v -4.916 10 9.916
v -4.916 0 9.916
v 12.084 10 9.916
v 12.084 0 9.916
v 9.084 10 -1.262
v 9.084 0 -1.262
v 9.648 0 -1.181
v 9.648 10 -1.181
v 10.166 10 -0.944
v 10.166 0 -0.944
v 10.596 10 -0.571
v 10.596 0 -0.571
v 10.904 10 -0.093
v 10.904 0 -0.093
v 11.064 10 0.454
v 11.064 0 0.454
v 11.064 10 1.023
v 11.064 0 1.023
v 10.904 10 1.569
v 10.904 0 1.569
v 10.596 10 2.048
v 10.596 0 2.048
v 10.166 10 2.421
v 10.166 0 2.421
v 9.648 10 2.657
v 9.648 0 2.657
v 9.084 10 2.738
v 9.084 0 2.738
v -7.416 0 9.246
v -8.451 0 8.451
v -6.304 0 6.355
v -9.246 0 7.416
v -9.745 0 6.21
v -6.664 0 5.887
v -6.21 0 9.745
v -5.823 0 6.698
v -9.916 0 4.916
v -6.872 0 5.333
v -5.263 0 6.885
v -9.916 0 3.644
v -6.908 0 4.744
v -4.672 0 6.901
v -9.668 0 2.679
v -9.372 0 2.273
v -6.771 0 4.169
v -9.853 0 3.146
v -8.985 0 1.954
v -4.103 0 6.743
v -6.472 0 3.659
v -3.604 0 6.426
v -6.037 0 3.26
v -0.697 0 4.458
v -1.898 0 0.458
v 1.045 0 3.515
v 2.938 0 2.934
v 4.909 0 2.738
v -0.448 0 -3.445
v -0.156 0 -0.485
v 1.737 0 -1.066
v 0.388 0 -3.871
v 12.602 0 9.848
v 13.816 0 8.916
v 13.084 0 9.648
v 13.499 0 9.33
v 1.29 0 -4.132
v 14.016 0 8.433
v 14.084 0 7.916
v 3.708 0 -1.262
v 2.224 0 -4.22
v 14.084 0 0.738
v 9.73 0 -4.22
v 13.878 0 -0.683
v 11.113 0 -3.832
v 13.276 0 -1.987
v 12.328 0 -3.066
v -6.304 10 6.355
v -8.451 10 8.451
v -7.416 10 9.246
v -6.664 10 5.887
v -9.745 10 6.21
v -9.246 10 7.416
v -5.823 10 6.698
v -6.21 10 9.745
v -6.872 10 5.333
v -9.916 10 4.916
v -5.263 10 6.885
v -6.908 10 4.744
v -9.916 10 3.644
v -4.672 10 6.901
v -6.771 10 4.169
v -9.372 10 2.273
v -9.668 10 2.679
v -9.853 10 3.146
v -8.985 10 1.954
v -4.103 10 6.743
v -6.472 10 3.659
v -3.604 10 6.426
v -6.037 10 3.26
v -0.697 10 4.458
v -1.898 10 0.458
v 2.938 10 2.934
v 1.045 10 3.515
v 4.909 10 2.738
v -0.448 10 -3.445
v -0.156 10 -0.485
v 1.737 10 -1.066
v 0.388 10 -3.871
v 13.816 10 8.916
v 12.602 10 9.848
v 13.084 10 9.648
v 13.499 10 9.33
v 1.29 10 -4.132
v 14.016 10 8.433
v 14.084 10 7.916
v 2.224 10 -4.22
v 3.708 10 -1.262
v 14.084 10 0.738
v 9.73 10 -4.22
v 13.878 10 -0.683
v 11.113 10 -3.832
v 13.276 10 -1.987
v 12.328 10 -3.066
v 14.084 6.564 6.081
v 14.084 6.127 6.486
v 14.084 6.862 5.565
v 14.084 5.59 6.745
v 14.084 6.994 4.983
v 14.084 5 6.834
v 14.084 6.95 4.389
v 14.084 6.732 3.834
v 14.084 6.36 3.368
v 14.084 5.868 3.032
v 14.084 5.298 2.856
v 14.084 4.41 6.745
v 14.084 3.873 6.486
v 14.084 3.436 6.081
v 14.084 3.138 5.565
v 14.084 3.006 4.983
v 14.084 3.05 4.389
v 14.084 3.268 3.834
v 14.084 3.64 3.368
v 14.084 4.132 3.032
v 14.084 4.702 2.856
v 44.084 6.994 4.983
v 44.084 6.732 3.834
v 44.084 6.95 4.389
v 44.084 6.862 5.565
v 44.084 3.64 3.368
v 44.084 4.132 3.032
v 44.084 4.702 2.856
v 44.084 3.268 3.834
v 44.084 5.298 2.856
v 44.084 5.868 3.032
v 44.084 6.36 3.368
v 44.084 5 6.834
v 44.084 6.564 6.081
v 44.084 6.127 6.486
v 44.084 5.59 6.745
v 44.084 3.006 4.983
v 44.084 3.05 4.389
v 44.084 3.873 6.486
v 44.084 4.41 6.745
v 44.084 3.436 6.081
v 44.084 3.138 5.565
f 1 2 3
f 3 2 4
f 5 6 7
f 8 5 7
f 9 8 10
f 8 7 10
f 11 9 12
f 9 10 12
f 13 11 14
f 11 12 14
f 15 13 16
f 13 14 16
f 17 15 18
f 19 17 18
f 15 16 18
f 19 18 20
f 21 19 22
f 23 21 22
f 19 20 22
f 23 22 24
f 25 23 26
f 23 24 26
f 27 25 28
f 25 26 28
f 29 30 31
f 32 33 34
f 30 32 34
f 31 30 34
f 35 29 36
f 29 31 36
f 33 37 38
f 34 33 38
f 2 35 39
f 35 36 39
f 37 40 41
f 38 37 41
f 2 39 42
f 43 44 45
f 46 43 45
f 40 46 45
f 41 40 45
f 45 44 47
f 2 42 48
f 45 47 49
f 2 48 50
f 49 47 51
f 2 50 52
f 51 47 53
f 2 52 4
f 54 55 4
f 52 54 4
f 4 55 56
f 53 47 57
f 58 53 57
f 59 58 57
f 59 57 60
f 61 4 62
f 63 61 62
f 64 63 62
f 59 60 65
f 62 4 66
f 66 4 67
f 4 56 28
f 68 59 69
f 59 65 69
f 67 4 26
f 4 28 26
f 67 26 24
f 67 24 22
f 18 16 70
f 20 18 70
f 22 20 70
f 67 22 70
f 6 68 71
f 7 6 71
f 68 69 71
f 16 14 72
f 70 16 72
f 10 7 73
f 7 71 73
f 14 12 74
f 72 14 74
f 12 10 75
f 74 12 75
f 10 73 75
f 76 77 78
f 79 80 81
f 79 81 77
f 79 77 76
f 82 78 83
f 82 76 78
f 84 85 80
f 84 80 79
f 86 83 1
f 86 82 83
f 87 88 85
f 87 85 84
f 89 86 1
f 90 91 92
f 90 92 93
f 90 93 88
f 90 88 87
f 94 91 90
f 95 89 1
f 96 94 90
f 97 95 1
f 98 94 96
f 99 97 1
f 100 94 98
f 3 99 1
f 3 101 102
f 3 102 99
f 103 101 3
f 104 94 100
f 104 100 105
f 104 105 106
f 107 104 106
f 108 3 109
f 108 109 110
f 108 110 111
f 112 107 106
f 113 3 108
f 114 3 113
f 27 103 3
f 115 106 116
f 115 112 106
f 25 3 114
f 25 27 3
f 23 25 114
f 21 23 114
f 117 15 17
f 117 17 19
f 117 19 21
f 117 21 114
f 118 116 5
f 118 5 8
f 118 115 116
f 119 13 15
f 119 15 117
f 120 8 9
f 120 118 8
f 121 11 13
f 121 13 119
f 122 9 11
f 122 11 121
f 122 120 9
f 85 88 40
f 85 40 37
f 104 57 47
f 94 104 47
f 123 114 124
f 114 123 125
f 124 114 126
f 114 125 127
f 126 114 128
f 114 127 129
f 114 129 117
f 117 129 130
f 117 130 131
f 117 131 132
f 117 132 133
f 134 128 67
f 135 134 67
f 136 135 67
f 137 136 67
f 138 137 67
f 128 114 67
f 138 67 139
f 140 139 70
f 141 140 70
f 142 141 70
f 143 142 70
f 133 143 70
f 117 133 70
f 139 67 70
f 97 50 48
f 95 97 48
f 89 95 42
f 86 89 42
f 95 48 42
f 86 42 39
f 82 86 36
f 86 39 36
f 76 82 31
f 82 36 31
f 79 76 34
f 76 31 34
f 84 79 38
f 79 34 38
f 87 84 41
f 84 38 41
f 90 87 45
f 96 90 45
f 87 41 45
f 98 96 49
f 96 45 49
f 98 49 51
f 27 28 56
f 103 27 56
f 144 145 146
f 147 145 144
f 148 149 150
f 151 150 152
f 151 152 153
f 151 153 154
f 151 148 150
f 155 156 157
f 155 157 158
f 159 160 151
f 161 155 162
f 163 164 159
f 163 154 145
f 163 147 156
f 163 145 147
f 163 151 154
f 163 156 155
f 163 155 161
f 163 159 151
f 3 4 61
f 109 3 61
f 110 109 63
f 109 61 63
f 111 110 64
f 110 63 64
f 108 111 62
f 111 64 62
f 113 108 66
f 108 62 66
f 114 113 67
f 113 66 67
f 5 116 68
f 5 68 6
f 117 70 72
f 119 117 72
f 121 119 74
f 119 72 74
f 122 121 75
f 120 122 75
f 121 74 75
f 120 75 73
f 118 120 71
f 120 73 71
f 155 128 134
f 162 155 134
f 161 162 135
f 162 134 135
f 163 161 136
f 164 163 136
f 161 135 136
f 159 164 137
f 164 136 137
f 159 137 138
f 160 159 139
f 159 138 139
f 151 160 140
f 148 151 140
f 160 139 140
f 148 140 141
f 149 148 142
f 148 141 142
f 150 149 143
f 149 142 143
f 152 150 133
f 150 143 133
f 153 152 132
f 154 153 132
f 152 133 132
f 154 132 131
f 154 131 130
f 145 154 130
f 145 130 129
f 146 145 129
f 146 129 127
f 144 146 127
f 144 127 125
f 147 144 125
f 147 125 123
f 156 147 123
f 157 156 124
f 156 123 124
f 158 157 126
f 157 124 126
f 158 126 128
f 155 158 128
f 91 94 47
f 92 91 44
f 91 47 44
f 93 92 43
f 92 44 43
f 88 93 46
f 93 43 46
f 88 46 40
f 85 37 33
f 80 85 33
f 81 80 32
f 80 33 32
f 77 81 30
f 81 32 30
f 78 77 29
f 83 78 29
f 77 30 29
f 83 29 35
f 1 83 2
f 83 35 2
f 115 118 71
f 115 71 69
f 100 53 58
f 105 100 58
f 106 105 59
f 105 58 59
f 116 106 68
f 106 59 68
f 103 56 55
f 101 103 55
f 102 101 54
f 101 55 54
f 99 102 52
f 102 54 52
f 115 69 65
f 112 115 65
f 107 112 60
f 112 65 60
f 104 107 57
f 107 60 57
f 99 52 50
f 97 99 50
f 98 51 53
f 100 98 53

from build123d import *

# Parameters (mm, degrees)
BOSS_EXTRUDE1_DEPTH = 10
SKETCH2_R           = 2
BOSS_EXTRUDE2_DEPTH = 30


with BuildPart() as part:
    # Sketch1 → Boss-Extrude1 (new body)
    with BuildSketch(Plane(origin=(0, 0, 0), x_dir=(1, 0, 0), z_dir=(0, 1, 0))):
        with BuildLine():
            Line((-4.915670141, -9.915670141), (12.084329859, -9.915670141))
            ThreePointArc((12.084329859, -9.915670141), (13.498543421, -9.329883704), (14.084329859, -7.915670141))
            Line((14.084329859, -7.915670141), (14.084329859, -0.738316599))
            ThreePointArc((14.084329859, -0.738316599), (12.841308154, 2.560943028), (9.730284223, 4.219782125))
            Line((9.730284223, 4.219782125), (2.224360471, 4.219782125))
            ThreePointArc((2.224360471, 4.219782125), (0.833058018, 4.022310364), (-0.448347257, 3.445493118))
            Line((-0.448347257, 3.445493118), (-8.984753233, -1.953673617))
            ThreePointArc((-8.984753233, -1.953673617), (-9.667550015, -2.67911766), (-9.915670141, -3.643958014))
            Line((-9.915670141, -3.643958014), (-9.915670141, -4.915670141))
            ThreePointArc((-9.915670141, -4.915670141), (-8.451204047, -8.451204047), (-4.915670141, -9.915670141))
        make_face()
        with BuildLine():
            Line((-6.036927005, -3.259535169), (-1.898433993, -0.45764174))
            ThreePointArc((-1.898433993, -0.45764174), (0.775850036, 0.822194595), (3.707850327, 1.261683401))
            Line((3.707850327, 1.261683401), (9.084329859, 1.261683401))
            ThreePointArc((9.084329859, 1.261683401), (11.084329859, -0.738316599), (9.084329859, -2.738316599))
            Line((9.084329859, -2.738316599), (4.908888201, -2.738316599))
            ThreePointArc((4.908888201, -2.738316599), (1.976887911, -3.177805405), (-0.697396118, -4.45764174))
            Line((-0.697396118, -4.45764174), (-3.604145519, -6.425604963))
            ThreePointArc((-3.604145519, -6.425604963), (-6.501561039, -6.134255412), (-6.036927005, -3.259535169))
        make_face(mode=Mode.SUBTRACT)
    extrude(amount=BOSS_EXTRUDE1_DEPTH)

    # Sketch2 → Boss-Extrude2 (add)
    with BuildSketch(Plane(origin=(14.084329859, 0, 0), x_dir=(0, 0, -1), z_dir=(1, 0, 0))):
        with Locations(Location((-4.833857575, 5, 0), (0, 0, 180))):
            Circle(SKETCH2_R)
    extrude(amount=BOSS_EXTRUDE2_DEPTH)


solid = part.part
